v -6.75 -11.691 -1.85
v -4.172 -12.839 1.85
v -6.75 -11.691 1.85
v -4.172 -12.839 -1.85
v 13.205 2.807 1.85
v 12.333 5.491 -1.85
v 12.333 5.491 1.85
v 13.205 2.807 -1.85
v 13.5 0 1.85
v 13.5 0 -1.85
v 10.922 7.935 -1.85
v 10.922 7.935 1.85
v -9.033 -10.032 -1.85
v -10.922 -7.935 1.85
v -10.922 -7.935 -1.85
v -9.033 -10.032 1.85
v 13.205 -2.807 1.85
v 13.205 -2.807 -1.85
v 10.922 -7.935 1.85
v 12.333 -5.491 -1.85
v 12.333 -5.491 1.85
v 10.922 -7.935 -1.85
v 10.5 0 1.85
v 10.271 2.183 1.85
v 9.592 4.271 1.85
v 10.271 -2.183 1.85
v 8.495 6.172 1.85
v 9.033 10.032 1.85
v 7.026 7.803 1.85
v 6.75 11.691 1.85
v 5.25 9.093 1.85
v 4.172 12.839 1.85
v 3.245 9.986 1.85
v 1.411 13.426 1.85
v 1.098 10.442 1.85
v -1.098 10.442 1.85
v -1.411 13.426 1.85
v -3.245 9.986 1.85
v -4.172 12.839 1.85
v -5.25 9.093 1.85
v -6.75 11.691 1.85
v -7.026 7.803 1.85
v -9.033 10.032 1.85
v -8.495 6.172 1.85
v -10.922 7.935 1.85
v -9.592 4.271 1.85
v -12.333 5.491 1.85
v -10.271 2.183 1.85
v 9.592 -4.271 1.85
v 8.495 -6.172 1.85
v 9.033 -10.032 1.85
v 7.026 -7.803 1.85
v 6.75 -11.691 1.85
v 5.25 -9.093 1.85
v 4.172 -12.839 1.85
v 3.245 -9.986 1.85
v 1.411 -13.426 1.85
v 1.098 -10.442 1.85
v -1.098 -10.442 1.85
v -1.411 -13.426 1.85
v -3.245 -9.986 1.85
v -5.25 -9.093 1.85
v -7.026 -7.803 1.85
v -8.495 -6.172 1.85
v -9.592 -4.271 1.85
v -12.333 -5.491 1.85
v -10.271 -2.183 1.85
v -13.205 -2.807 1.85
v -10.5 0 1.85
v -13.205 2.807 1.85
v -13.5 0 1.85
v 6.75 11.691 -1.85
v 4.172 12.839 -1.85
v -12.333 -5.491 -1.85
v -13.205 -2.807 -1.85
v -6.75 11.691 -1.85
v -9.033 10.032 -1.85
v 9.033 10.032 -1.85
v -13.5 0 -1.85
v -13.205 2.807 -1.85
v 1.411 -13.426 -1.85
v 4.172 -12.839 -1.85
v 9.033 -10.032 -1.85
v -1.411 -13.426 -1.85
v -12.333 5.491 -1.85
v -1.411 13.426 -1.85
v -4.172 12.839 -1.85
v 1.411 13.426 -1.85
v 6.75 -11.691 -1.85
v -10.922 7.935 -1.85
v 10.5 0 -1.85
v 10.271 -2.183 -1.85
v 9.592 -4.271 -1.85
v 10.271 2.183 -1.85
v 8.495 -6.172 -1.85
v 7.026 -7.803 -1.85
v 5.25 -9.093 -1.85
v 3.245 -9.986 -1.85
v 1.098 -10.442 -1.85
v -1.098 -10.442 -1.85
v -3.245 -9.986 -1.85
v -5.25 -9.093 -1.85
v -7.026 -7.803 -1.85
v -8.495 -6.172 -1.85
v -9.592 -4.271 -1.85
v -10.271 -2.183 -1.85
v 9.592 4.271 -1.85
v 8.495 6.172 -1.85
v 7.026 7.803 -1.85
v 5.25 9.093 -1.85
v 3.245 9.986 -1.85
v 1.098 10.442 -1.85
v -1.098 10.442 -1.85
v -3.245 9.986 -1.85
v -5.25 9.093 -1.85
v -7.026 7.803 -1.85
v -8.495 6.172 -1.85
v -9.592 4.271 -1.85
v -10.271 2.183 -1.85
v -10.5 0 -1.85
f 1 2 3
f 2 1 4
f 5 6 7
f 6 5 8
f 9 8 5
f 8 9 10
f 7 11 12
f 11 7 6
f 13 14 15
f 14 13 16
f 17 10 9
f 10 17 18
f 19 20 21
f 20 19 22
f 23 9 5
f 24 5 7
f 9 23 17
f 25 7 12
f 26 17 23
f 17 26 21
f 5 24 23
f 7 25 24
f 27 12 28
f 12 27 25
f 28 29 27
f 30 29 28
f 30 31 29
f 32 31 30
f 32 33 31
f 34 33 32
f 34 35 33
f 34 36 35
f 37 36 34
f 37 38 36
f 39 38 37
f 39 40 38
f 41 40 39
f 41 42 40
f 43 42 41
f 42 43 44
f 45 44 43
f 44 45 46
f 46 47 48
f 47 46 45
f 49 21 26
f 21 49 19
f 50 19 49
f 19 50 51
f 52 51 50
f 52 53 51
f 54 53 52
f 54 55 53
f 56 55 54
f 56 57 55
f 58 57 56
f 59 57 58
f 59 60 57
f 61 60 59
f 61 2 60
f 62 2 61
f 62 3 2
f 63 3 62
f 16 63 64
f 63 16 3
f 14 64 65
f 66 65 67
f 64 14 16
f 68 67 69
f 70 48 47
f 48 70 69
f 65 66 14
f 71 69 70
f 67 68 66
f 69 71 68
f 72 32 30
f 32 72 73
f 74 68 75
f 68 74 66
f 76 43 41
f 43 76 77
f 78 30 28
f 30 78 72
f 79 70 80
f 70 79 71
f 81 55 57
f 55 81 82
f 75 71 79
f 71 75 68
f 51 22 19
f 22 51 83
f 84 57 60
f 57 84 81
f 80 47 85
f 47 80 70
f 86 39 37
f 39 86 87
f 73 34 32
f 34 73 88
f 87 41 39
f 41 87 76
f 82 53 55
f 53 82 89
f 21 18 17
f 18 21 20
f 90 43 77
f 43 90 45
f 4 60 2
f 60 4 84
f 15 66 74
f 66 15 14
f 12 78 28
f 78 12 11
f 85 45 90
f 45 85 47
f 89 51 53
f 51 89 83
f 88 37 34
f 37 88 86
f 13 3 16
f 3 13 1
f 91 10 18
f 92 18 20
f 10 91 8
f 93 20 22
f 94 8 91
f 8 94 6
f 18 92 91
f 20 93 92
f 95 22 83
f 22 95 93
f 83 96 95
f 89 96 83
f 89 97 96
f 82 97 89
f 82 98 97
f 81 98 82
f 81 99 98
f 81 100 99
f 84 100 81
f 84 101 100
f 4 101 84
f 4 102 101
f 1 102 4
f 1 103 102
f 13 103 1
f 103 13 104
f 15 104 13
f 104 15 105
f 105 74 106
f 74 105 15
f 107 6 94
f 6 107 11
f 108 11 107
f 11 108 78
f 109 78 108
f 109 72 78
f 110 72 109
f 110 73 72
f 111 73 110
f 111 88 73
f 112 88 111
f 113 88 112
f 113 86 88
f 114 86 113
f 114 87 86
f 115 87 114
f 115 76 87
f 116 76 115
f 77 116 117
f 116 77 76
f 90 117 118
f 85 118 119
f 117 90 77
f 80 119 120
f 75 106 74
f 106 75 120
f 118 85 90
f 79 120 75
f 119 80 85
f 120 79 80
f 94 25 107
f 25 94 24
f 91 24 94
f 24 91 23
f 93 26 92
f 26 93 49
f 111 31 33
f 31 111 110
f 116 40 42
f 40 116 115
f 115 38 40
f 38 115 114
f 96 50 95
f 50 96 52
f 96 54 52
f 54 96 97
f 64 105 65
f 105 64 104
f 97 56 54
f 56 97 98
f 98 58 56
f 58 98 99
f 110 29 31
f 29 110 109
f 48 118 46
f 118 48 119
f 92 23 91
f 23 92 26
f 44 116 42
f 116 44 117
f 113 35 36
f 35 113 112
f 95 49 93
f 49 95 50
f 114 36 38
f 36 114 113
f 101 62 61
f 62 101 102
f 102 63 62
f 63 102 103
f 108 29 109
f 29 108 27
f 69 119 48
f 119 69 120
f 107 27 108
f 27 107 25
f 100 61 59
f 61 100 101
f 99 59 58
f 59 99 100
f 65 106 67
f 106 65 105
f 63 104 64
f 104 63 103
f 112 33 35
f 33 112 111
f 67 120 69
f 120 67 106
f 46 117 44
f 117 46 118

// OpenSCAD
// Parameters
r_inner = 10.5; //[5.25:21:0.1]
r_outer = 13.5; //[6.75:27:0.1]
thickness = 3.7; //[1.85:7.4:0.1]

// Geometry
module radial_outer_cyl() {
  cylinder(h=thickness, r=r_outer, center=true);
}

module radial_inner_cyl_cut() {
  cylinder(h=thickness, r=r_inner, center=true);
}

// Final Output
difference() {
  radial_outer_cyl();
  radial_inner_cyl_cut();
}
